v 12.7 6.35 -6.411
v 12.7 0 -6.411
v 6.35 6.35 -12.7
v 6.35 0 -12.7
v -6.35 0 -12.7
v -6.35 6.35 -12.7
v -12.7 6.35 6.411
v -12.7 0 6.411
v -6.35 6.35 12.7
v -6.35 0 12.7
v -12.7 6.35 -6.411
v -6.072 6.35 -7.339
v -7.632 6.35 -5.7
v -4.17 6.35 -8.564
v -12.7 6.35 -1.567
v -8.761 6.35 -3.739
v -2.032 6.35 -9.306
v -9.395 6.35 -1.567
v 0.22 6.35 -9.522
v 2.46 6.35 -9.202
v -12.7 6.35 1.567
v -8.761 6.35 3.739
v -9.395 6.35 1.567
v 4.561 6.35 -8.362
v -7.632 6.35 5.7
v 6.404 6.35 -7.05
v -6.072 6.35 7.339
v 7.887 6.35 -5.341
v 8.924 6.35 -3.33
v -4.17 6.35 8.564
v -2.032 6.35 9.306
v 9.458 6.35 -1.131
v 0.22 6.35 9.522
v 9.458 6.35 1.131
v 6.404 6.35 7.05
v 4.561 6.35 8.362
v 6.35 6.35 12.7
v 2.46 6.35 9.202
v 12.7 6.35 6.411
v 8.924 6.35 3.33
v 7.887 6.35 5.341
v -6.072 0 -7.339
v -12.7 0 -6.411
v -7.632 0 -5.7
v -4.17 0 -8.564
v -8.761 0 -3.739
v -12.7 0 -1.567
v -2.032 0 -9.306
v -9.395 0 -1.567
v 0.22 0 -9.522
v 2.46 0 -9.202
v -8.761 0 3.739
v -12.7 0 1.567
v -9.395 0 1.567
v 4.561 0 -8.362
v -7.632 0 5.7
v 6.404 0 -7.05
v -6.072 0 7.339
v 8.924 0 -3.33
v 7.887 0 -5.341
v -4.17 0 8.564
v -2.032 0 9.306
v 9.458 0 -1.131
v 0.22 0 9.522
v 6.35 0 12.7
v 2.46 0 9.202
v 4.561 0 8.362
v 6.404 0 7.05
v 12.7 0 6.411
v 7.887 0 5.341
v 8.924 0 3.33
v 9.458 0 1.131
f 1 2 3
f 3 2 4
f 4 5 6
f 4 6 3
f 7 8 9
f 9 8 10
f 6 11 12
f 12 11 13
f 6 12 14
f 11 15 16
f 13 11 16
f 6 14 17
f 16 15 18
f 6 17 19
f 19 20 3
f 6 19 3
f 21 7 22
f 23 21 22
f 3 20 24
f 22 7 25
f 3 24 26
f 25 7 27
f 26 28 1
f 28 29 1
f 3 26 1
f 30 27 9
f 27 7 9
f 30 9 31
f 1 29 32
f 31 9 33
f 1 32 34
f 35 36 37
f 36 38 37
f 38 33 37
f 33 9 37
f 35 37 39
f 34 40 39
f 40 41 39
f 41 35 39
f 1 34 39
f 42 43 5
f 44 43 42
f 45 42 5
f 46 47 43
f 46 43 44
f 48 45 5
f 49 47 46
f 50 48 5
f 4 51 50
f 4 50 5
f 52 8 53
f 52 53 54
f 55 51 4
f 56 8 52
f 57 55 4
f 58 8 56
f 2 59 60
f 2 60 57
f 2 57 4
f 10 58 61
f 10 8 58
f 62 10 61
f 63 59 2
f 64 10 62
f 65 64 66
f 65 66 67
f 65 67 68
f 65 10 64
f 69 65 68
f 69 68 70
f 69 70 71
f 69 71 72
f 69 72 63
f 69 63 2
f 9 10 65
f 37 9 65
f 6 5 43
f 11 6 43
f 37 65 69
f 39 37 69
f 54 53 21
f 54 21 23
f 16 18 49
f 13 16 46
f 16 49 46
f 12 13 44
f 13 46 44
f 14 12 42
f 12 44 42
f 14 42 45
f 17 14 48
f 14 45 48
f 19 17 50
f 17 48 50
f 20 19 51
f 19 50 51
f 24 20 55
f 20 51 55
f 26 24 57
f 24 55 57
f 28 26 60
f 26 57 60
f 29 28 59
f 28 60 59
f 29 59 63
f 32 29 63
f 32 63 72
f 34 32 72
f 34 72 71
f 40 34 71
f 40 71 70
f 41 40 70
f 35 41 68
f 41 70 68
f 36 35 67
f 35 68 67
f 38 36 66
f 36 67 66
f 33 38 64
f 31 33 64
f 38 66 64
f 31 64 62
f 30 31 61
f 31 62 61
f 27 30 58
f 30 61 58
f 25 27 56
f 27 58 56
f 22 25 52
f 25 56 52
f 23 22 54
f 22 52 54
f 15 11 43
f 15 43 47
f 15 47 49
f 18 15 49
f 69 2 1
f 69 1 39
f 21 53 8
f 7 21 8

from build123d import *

# Parameters (mm, degrees)
F0_W     = 25.4
F0_H     = 25.4
F1_DEPTH = 6.35
F2_R     = 9.525
F3_DEPTH = 6.35
F5_DEPTH = 6.35
F6_W     = 15.854515
F6_H     = 3.134032
F7_DEPTH = 6.35


with BuildPart() as f1:
    # F0 (on Front) → F1 (new body)
    with BuildSketch(Plane.XZ):
        Rectangle(F0_W, F0_H)
    extrude(amount=-F1_DEPTH)

    # F2 (on face) → F3 (cut)
    with BuildSketch(Plane.XZ):
        Circle(F2_R)
    extrude(amount=-F3_DEPTH, mode=Mode.SUBTRACT)

    # F4 (on Front) → F5 (cut)
    with BuildSketch(Plane.XZ):
        Polygon((12.761054, 6.350294), (12.7, 12.7), (6.35, 12.7), align=None)
        Polygon((-6.35, 12.7), (-12.7, 12.7), (-12.761054, 6.350294), align=None)
        Polygon((-12.761054, -6.350294), (-12.7, -12.7), (-6.35, -12.7), align=None)
        Polygon((6.35, -12.7), (12.7, -12.7), (12.761054, -6.350294), align=None)
    extrude(amount=-F5_DEPTH, mode=Mode.SUBTRACT)

    # F6 (on Front) → F7 (cut)
    with BuildSketch(Plane.XZ):
        with Locations((-14.840564, 0)):
            Rectangle(F6_W, F6_H)
    extrude(amount=-F7_DEPTH, mode=Mode.SUBTRACT)


solid = f1.part
